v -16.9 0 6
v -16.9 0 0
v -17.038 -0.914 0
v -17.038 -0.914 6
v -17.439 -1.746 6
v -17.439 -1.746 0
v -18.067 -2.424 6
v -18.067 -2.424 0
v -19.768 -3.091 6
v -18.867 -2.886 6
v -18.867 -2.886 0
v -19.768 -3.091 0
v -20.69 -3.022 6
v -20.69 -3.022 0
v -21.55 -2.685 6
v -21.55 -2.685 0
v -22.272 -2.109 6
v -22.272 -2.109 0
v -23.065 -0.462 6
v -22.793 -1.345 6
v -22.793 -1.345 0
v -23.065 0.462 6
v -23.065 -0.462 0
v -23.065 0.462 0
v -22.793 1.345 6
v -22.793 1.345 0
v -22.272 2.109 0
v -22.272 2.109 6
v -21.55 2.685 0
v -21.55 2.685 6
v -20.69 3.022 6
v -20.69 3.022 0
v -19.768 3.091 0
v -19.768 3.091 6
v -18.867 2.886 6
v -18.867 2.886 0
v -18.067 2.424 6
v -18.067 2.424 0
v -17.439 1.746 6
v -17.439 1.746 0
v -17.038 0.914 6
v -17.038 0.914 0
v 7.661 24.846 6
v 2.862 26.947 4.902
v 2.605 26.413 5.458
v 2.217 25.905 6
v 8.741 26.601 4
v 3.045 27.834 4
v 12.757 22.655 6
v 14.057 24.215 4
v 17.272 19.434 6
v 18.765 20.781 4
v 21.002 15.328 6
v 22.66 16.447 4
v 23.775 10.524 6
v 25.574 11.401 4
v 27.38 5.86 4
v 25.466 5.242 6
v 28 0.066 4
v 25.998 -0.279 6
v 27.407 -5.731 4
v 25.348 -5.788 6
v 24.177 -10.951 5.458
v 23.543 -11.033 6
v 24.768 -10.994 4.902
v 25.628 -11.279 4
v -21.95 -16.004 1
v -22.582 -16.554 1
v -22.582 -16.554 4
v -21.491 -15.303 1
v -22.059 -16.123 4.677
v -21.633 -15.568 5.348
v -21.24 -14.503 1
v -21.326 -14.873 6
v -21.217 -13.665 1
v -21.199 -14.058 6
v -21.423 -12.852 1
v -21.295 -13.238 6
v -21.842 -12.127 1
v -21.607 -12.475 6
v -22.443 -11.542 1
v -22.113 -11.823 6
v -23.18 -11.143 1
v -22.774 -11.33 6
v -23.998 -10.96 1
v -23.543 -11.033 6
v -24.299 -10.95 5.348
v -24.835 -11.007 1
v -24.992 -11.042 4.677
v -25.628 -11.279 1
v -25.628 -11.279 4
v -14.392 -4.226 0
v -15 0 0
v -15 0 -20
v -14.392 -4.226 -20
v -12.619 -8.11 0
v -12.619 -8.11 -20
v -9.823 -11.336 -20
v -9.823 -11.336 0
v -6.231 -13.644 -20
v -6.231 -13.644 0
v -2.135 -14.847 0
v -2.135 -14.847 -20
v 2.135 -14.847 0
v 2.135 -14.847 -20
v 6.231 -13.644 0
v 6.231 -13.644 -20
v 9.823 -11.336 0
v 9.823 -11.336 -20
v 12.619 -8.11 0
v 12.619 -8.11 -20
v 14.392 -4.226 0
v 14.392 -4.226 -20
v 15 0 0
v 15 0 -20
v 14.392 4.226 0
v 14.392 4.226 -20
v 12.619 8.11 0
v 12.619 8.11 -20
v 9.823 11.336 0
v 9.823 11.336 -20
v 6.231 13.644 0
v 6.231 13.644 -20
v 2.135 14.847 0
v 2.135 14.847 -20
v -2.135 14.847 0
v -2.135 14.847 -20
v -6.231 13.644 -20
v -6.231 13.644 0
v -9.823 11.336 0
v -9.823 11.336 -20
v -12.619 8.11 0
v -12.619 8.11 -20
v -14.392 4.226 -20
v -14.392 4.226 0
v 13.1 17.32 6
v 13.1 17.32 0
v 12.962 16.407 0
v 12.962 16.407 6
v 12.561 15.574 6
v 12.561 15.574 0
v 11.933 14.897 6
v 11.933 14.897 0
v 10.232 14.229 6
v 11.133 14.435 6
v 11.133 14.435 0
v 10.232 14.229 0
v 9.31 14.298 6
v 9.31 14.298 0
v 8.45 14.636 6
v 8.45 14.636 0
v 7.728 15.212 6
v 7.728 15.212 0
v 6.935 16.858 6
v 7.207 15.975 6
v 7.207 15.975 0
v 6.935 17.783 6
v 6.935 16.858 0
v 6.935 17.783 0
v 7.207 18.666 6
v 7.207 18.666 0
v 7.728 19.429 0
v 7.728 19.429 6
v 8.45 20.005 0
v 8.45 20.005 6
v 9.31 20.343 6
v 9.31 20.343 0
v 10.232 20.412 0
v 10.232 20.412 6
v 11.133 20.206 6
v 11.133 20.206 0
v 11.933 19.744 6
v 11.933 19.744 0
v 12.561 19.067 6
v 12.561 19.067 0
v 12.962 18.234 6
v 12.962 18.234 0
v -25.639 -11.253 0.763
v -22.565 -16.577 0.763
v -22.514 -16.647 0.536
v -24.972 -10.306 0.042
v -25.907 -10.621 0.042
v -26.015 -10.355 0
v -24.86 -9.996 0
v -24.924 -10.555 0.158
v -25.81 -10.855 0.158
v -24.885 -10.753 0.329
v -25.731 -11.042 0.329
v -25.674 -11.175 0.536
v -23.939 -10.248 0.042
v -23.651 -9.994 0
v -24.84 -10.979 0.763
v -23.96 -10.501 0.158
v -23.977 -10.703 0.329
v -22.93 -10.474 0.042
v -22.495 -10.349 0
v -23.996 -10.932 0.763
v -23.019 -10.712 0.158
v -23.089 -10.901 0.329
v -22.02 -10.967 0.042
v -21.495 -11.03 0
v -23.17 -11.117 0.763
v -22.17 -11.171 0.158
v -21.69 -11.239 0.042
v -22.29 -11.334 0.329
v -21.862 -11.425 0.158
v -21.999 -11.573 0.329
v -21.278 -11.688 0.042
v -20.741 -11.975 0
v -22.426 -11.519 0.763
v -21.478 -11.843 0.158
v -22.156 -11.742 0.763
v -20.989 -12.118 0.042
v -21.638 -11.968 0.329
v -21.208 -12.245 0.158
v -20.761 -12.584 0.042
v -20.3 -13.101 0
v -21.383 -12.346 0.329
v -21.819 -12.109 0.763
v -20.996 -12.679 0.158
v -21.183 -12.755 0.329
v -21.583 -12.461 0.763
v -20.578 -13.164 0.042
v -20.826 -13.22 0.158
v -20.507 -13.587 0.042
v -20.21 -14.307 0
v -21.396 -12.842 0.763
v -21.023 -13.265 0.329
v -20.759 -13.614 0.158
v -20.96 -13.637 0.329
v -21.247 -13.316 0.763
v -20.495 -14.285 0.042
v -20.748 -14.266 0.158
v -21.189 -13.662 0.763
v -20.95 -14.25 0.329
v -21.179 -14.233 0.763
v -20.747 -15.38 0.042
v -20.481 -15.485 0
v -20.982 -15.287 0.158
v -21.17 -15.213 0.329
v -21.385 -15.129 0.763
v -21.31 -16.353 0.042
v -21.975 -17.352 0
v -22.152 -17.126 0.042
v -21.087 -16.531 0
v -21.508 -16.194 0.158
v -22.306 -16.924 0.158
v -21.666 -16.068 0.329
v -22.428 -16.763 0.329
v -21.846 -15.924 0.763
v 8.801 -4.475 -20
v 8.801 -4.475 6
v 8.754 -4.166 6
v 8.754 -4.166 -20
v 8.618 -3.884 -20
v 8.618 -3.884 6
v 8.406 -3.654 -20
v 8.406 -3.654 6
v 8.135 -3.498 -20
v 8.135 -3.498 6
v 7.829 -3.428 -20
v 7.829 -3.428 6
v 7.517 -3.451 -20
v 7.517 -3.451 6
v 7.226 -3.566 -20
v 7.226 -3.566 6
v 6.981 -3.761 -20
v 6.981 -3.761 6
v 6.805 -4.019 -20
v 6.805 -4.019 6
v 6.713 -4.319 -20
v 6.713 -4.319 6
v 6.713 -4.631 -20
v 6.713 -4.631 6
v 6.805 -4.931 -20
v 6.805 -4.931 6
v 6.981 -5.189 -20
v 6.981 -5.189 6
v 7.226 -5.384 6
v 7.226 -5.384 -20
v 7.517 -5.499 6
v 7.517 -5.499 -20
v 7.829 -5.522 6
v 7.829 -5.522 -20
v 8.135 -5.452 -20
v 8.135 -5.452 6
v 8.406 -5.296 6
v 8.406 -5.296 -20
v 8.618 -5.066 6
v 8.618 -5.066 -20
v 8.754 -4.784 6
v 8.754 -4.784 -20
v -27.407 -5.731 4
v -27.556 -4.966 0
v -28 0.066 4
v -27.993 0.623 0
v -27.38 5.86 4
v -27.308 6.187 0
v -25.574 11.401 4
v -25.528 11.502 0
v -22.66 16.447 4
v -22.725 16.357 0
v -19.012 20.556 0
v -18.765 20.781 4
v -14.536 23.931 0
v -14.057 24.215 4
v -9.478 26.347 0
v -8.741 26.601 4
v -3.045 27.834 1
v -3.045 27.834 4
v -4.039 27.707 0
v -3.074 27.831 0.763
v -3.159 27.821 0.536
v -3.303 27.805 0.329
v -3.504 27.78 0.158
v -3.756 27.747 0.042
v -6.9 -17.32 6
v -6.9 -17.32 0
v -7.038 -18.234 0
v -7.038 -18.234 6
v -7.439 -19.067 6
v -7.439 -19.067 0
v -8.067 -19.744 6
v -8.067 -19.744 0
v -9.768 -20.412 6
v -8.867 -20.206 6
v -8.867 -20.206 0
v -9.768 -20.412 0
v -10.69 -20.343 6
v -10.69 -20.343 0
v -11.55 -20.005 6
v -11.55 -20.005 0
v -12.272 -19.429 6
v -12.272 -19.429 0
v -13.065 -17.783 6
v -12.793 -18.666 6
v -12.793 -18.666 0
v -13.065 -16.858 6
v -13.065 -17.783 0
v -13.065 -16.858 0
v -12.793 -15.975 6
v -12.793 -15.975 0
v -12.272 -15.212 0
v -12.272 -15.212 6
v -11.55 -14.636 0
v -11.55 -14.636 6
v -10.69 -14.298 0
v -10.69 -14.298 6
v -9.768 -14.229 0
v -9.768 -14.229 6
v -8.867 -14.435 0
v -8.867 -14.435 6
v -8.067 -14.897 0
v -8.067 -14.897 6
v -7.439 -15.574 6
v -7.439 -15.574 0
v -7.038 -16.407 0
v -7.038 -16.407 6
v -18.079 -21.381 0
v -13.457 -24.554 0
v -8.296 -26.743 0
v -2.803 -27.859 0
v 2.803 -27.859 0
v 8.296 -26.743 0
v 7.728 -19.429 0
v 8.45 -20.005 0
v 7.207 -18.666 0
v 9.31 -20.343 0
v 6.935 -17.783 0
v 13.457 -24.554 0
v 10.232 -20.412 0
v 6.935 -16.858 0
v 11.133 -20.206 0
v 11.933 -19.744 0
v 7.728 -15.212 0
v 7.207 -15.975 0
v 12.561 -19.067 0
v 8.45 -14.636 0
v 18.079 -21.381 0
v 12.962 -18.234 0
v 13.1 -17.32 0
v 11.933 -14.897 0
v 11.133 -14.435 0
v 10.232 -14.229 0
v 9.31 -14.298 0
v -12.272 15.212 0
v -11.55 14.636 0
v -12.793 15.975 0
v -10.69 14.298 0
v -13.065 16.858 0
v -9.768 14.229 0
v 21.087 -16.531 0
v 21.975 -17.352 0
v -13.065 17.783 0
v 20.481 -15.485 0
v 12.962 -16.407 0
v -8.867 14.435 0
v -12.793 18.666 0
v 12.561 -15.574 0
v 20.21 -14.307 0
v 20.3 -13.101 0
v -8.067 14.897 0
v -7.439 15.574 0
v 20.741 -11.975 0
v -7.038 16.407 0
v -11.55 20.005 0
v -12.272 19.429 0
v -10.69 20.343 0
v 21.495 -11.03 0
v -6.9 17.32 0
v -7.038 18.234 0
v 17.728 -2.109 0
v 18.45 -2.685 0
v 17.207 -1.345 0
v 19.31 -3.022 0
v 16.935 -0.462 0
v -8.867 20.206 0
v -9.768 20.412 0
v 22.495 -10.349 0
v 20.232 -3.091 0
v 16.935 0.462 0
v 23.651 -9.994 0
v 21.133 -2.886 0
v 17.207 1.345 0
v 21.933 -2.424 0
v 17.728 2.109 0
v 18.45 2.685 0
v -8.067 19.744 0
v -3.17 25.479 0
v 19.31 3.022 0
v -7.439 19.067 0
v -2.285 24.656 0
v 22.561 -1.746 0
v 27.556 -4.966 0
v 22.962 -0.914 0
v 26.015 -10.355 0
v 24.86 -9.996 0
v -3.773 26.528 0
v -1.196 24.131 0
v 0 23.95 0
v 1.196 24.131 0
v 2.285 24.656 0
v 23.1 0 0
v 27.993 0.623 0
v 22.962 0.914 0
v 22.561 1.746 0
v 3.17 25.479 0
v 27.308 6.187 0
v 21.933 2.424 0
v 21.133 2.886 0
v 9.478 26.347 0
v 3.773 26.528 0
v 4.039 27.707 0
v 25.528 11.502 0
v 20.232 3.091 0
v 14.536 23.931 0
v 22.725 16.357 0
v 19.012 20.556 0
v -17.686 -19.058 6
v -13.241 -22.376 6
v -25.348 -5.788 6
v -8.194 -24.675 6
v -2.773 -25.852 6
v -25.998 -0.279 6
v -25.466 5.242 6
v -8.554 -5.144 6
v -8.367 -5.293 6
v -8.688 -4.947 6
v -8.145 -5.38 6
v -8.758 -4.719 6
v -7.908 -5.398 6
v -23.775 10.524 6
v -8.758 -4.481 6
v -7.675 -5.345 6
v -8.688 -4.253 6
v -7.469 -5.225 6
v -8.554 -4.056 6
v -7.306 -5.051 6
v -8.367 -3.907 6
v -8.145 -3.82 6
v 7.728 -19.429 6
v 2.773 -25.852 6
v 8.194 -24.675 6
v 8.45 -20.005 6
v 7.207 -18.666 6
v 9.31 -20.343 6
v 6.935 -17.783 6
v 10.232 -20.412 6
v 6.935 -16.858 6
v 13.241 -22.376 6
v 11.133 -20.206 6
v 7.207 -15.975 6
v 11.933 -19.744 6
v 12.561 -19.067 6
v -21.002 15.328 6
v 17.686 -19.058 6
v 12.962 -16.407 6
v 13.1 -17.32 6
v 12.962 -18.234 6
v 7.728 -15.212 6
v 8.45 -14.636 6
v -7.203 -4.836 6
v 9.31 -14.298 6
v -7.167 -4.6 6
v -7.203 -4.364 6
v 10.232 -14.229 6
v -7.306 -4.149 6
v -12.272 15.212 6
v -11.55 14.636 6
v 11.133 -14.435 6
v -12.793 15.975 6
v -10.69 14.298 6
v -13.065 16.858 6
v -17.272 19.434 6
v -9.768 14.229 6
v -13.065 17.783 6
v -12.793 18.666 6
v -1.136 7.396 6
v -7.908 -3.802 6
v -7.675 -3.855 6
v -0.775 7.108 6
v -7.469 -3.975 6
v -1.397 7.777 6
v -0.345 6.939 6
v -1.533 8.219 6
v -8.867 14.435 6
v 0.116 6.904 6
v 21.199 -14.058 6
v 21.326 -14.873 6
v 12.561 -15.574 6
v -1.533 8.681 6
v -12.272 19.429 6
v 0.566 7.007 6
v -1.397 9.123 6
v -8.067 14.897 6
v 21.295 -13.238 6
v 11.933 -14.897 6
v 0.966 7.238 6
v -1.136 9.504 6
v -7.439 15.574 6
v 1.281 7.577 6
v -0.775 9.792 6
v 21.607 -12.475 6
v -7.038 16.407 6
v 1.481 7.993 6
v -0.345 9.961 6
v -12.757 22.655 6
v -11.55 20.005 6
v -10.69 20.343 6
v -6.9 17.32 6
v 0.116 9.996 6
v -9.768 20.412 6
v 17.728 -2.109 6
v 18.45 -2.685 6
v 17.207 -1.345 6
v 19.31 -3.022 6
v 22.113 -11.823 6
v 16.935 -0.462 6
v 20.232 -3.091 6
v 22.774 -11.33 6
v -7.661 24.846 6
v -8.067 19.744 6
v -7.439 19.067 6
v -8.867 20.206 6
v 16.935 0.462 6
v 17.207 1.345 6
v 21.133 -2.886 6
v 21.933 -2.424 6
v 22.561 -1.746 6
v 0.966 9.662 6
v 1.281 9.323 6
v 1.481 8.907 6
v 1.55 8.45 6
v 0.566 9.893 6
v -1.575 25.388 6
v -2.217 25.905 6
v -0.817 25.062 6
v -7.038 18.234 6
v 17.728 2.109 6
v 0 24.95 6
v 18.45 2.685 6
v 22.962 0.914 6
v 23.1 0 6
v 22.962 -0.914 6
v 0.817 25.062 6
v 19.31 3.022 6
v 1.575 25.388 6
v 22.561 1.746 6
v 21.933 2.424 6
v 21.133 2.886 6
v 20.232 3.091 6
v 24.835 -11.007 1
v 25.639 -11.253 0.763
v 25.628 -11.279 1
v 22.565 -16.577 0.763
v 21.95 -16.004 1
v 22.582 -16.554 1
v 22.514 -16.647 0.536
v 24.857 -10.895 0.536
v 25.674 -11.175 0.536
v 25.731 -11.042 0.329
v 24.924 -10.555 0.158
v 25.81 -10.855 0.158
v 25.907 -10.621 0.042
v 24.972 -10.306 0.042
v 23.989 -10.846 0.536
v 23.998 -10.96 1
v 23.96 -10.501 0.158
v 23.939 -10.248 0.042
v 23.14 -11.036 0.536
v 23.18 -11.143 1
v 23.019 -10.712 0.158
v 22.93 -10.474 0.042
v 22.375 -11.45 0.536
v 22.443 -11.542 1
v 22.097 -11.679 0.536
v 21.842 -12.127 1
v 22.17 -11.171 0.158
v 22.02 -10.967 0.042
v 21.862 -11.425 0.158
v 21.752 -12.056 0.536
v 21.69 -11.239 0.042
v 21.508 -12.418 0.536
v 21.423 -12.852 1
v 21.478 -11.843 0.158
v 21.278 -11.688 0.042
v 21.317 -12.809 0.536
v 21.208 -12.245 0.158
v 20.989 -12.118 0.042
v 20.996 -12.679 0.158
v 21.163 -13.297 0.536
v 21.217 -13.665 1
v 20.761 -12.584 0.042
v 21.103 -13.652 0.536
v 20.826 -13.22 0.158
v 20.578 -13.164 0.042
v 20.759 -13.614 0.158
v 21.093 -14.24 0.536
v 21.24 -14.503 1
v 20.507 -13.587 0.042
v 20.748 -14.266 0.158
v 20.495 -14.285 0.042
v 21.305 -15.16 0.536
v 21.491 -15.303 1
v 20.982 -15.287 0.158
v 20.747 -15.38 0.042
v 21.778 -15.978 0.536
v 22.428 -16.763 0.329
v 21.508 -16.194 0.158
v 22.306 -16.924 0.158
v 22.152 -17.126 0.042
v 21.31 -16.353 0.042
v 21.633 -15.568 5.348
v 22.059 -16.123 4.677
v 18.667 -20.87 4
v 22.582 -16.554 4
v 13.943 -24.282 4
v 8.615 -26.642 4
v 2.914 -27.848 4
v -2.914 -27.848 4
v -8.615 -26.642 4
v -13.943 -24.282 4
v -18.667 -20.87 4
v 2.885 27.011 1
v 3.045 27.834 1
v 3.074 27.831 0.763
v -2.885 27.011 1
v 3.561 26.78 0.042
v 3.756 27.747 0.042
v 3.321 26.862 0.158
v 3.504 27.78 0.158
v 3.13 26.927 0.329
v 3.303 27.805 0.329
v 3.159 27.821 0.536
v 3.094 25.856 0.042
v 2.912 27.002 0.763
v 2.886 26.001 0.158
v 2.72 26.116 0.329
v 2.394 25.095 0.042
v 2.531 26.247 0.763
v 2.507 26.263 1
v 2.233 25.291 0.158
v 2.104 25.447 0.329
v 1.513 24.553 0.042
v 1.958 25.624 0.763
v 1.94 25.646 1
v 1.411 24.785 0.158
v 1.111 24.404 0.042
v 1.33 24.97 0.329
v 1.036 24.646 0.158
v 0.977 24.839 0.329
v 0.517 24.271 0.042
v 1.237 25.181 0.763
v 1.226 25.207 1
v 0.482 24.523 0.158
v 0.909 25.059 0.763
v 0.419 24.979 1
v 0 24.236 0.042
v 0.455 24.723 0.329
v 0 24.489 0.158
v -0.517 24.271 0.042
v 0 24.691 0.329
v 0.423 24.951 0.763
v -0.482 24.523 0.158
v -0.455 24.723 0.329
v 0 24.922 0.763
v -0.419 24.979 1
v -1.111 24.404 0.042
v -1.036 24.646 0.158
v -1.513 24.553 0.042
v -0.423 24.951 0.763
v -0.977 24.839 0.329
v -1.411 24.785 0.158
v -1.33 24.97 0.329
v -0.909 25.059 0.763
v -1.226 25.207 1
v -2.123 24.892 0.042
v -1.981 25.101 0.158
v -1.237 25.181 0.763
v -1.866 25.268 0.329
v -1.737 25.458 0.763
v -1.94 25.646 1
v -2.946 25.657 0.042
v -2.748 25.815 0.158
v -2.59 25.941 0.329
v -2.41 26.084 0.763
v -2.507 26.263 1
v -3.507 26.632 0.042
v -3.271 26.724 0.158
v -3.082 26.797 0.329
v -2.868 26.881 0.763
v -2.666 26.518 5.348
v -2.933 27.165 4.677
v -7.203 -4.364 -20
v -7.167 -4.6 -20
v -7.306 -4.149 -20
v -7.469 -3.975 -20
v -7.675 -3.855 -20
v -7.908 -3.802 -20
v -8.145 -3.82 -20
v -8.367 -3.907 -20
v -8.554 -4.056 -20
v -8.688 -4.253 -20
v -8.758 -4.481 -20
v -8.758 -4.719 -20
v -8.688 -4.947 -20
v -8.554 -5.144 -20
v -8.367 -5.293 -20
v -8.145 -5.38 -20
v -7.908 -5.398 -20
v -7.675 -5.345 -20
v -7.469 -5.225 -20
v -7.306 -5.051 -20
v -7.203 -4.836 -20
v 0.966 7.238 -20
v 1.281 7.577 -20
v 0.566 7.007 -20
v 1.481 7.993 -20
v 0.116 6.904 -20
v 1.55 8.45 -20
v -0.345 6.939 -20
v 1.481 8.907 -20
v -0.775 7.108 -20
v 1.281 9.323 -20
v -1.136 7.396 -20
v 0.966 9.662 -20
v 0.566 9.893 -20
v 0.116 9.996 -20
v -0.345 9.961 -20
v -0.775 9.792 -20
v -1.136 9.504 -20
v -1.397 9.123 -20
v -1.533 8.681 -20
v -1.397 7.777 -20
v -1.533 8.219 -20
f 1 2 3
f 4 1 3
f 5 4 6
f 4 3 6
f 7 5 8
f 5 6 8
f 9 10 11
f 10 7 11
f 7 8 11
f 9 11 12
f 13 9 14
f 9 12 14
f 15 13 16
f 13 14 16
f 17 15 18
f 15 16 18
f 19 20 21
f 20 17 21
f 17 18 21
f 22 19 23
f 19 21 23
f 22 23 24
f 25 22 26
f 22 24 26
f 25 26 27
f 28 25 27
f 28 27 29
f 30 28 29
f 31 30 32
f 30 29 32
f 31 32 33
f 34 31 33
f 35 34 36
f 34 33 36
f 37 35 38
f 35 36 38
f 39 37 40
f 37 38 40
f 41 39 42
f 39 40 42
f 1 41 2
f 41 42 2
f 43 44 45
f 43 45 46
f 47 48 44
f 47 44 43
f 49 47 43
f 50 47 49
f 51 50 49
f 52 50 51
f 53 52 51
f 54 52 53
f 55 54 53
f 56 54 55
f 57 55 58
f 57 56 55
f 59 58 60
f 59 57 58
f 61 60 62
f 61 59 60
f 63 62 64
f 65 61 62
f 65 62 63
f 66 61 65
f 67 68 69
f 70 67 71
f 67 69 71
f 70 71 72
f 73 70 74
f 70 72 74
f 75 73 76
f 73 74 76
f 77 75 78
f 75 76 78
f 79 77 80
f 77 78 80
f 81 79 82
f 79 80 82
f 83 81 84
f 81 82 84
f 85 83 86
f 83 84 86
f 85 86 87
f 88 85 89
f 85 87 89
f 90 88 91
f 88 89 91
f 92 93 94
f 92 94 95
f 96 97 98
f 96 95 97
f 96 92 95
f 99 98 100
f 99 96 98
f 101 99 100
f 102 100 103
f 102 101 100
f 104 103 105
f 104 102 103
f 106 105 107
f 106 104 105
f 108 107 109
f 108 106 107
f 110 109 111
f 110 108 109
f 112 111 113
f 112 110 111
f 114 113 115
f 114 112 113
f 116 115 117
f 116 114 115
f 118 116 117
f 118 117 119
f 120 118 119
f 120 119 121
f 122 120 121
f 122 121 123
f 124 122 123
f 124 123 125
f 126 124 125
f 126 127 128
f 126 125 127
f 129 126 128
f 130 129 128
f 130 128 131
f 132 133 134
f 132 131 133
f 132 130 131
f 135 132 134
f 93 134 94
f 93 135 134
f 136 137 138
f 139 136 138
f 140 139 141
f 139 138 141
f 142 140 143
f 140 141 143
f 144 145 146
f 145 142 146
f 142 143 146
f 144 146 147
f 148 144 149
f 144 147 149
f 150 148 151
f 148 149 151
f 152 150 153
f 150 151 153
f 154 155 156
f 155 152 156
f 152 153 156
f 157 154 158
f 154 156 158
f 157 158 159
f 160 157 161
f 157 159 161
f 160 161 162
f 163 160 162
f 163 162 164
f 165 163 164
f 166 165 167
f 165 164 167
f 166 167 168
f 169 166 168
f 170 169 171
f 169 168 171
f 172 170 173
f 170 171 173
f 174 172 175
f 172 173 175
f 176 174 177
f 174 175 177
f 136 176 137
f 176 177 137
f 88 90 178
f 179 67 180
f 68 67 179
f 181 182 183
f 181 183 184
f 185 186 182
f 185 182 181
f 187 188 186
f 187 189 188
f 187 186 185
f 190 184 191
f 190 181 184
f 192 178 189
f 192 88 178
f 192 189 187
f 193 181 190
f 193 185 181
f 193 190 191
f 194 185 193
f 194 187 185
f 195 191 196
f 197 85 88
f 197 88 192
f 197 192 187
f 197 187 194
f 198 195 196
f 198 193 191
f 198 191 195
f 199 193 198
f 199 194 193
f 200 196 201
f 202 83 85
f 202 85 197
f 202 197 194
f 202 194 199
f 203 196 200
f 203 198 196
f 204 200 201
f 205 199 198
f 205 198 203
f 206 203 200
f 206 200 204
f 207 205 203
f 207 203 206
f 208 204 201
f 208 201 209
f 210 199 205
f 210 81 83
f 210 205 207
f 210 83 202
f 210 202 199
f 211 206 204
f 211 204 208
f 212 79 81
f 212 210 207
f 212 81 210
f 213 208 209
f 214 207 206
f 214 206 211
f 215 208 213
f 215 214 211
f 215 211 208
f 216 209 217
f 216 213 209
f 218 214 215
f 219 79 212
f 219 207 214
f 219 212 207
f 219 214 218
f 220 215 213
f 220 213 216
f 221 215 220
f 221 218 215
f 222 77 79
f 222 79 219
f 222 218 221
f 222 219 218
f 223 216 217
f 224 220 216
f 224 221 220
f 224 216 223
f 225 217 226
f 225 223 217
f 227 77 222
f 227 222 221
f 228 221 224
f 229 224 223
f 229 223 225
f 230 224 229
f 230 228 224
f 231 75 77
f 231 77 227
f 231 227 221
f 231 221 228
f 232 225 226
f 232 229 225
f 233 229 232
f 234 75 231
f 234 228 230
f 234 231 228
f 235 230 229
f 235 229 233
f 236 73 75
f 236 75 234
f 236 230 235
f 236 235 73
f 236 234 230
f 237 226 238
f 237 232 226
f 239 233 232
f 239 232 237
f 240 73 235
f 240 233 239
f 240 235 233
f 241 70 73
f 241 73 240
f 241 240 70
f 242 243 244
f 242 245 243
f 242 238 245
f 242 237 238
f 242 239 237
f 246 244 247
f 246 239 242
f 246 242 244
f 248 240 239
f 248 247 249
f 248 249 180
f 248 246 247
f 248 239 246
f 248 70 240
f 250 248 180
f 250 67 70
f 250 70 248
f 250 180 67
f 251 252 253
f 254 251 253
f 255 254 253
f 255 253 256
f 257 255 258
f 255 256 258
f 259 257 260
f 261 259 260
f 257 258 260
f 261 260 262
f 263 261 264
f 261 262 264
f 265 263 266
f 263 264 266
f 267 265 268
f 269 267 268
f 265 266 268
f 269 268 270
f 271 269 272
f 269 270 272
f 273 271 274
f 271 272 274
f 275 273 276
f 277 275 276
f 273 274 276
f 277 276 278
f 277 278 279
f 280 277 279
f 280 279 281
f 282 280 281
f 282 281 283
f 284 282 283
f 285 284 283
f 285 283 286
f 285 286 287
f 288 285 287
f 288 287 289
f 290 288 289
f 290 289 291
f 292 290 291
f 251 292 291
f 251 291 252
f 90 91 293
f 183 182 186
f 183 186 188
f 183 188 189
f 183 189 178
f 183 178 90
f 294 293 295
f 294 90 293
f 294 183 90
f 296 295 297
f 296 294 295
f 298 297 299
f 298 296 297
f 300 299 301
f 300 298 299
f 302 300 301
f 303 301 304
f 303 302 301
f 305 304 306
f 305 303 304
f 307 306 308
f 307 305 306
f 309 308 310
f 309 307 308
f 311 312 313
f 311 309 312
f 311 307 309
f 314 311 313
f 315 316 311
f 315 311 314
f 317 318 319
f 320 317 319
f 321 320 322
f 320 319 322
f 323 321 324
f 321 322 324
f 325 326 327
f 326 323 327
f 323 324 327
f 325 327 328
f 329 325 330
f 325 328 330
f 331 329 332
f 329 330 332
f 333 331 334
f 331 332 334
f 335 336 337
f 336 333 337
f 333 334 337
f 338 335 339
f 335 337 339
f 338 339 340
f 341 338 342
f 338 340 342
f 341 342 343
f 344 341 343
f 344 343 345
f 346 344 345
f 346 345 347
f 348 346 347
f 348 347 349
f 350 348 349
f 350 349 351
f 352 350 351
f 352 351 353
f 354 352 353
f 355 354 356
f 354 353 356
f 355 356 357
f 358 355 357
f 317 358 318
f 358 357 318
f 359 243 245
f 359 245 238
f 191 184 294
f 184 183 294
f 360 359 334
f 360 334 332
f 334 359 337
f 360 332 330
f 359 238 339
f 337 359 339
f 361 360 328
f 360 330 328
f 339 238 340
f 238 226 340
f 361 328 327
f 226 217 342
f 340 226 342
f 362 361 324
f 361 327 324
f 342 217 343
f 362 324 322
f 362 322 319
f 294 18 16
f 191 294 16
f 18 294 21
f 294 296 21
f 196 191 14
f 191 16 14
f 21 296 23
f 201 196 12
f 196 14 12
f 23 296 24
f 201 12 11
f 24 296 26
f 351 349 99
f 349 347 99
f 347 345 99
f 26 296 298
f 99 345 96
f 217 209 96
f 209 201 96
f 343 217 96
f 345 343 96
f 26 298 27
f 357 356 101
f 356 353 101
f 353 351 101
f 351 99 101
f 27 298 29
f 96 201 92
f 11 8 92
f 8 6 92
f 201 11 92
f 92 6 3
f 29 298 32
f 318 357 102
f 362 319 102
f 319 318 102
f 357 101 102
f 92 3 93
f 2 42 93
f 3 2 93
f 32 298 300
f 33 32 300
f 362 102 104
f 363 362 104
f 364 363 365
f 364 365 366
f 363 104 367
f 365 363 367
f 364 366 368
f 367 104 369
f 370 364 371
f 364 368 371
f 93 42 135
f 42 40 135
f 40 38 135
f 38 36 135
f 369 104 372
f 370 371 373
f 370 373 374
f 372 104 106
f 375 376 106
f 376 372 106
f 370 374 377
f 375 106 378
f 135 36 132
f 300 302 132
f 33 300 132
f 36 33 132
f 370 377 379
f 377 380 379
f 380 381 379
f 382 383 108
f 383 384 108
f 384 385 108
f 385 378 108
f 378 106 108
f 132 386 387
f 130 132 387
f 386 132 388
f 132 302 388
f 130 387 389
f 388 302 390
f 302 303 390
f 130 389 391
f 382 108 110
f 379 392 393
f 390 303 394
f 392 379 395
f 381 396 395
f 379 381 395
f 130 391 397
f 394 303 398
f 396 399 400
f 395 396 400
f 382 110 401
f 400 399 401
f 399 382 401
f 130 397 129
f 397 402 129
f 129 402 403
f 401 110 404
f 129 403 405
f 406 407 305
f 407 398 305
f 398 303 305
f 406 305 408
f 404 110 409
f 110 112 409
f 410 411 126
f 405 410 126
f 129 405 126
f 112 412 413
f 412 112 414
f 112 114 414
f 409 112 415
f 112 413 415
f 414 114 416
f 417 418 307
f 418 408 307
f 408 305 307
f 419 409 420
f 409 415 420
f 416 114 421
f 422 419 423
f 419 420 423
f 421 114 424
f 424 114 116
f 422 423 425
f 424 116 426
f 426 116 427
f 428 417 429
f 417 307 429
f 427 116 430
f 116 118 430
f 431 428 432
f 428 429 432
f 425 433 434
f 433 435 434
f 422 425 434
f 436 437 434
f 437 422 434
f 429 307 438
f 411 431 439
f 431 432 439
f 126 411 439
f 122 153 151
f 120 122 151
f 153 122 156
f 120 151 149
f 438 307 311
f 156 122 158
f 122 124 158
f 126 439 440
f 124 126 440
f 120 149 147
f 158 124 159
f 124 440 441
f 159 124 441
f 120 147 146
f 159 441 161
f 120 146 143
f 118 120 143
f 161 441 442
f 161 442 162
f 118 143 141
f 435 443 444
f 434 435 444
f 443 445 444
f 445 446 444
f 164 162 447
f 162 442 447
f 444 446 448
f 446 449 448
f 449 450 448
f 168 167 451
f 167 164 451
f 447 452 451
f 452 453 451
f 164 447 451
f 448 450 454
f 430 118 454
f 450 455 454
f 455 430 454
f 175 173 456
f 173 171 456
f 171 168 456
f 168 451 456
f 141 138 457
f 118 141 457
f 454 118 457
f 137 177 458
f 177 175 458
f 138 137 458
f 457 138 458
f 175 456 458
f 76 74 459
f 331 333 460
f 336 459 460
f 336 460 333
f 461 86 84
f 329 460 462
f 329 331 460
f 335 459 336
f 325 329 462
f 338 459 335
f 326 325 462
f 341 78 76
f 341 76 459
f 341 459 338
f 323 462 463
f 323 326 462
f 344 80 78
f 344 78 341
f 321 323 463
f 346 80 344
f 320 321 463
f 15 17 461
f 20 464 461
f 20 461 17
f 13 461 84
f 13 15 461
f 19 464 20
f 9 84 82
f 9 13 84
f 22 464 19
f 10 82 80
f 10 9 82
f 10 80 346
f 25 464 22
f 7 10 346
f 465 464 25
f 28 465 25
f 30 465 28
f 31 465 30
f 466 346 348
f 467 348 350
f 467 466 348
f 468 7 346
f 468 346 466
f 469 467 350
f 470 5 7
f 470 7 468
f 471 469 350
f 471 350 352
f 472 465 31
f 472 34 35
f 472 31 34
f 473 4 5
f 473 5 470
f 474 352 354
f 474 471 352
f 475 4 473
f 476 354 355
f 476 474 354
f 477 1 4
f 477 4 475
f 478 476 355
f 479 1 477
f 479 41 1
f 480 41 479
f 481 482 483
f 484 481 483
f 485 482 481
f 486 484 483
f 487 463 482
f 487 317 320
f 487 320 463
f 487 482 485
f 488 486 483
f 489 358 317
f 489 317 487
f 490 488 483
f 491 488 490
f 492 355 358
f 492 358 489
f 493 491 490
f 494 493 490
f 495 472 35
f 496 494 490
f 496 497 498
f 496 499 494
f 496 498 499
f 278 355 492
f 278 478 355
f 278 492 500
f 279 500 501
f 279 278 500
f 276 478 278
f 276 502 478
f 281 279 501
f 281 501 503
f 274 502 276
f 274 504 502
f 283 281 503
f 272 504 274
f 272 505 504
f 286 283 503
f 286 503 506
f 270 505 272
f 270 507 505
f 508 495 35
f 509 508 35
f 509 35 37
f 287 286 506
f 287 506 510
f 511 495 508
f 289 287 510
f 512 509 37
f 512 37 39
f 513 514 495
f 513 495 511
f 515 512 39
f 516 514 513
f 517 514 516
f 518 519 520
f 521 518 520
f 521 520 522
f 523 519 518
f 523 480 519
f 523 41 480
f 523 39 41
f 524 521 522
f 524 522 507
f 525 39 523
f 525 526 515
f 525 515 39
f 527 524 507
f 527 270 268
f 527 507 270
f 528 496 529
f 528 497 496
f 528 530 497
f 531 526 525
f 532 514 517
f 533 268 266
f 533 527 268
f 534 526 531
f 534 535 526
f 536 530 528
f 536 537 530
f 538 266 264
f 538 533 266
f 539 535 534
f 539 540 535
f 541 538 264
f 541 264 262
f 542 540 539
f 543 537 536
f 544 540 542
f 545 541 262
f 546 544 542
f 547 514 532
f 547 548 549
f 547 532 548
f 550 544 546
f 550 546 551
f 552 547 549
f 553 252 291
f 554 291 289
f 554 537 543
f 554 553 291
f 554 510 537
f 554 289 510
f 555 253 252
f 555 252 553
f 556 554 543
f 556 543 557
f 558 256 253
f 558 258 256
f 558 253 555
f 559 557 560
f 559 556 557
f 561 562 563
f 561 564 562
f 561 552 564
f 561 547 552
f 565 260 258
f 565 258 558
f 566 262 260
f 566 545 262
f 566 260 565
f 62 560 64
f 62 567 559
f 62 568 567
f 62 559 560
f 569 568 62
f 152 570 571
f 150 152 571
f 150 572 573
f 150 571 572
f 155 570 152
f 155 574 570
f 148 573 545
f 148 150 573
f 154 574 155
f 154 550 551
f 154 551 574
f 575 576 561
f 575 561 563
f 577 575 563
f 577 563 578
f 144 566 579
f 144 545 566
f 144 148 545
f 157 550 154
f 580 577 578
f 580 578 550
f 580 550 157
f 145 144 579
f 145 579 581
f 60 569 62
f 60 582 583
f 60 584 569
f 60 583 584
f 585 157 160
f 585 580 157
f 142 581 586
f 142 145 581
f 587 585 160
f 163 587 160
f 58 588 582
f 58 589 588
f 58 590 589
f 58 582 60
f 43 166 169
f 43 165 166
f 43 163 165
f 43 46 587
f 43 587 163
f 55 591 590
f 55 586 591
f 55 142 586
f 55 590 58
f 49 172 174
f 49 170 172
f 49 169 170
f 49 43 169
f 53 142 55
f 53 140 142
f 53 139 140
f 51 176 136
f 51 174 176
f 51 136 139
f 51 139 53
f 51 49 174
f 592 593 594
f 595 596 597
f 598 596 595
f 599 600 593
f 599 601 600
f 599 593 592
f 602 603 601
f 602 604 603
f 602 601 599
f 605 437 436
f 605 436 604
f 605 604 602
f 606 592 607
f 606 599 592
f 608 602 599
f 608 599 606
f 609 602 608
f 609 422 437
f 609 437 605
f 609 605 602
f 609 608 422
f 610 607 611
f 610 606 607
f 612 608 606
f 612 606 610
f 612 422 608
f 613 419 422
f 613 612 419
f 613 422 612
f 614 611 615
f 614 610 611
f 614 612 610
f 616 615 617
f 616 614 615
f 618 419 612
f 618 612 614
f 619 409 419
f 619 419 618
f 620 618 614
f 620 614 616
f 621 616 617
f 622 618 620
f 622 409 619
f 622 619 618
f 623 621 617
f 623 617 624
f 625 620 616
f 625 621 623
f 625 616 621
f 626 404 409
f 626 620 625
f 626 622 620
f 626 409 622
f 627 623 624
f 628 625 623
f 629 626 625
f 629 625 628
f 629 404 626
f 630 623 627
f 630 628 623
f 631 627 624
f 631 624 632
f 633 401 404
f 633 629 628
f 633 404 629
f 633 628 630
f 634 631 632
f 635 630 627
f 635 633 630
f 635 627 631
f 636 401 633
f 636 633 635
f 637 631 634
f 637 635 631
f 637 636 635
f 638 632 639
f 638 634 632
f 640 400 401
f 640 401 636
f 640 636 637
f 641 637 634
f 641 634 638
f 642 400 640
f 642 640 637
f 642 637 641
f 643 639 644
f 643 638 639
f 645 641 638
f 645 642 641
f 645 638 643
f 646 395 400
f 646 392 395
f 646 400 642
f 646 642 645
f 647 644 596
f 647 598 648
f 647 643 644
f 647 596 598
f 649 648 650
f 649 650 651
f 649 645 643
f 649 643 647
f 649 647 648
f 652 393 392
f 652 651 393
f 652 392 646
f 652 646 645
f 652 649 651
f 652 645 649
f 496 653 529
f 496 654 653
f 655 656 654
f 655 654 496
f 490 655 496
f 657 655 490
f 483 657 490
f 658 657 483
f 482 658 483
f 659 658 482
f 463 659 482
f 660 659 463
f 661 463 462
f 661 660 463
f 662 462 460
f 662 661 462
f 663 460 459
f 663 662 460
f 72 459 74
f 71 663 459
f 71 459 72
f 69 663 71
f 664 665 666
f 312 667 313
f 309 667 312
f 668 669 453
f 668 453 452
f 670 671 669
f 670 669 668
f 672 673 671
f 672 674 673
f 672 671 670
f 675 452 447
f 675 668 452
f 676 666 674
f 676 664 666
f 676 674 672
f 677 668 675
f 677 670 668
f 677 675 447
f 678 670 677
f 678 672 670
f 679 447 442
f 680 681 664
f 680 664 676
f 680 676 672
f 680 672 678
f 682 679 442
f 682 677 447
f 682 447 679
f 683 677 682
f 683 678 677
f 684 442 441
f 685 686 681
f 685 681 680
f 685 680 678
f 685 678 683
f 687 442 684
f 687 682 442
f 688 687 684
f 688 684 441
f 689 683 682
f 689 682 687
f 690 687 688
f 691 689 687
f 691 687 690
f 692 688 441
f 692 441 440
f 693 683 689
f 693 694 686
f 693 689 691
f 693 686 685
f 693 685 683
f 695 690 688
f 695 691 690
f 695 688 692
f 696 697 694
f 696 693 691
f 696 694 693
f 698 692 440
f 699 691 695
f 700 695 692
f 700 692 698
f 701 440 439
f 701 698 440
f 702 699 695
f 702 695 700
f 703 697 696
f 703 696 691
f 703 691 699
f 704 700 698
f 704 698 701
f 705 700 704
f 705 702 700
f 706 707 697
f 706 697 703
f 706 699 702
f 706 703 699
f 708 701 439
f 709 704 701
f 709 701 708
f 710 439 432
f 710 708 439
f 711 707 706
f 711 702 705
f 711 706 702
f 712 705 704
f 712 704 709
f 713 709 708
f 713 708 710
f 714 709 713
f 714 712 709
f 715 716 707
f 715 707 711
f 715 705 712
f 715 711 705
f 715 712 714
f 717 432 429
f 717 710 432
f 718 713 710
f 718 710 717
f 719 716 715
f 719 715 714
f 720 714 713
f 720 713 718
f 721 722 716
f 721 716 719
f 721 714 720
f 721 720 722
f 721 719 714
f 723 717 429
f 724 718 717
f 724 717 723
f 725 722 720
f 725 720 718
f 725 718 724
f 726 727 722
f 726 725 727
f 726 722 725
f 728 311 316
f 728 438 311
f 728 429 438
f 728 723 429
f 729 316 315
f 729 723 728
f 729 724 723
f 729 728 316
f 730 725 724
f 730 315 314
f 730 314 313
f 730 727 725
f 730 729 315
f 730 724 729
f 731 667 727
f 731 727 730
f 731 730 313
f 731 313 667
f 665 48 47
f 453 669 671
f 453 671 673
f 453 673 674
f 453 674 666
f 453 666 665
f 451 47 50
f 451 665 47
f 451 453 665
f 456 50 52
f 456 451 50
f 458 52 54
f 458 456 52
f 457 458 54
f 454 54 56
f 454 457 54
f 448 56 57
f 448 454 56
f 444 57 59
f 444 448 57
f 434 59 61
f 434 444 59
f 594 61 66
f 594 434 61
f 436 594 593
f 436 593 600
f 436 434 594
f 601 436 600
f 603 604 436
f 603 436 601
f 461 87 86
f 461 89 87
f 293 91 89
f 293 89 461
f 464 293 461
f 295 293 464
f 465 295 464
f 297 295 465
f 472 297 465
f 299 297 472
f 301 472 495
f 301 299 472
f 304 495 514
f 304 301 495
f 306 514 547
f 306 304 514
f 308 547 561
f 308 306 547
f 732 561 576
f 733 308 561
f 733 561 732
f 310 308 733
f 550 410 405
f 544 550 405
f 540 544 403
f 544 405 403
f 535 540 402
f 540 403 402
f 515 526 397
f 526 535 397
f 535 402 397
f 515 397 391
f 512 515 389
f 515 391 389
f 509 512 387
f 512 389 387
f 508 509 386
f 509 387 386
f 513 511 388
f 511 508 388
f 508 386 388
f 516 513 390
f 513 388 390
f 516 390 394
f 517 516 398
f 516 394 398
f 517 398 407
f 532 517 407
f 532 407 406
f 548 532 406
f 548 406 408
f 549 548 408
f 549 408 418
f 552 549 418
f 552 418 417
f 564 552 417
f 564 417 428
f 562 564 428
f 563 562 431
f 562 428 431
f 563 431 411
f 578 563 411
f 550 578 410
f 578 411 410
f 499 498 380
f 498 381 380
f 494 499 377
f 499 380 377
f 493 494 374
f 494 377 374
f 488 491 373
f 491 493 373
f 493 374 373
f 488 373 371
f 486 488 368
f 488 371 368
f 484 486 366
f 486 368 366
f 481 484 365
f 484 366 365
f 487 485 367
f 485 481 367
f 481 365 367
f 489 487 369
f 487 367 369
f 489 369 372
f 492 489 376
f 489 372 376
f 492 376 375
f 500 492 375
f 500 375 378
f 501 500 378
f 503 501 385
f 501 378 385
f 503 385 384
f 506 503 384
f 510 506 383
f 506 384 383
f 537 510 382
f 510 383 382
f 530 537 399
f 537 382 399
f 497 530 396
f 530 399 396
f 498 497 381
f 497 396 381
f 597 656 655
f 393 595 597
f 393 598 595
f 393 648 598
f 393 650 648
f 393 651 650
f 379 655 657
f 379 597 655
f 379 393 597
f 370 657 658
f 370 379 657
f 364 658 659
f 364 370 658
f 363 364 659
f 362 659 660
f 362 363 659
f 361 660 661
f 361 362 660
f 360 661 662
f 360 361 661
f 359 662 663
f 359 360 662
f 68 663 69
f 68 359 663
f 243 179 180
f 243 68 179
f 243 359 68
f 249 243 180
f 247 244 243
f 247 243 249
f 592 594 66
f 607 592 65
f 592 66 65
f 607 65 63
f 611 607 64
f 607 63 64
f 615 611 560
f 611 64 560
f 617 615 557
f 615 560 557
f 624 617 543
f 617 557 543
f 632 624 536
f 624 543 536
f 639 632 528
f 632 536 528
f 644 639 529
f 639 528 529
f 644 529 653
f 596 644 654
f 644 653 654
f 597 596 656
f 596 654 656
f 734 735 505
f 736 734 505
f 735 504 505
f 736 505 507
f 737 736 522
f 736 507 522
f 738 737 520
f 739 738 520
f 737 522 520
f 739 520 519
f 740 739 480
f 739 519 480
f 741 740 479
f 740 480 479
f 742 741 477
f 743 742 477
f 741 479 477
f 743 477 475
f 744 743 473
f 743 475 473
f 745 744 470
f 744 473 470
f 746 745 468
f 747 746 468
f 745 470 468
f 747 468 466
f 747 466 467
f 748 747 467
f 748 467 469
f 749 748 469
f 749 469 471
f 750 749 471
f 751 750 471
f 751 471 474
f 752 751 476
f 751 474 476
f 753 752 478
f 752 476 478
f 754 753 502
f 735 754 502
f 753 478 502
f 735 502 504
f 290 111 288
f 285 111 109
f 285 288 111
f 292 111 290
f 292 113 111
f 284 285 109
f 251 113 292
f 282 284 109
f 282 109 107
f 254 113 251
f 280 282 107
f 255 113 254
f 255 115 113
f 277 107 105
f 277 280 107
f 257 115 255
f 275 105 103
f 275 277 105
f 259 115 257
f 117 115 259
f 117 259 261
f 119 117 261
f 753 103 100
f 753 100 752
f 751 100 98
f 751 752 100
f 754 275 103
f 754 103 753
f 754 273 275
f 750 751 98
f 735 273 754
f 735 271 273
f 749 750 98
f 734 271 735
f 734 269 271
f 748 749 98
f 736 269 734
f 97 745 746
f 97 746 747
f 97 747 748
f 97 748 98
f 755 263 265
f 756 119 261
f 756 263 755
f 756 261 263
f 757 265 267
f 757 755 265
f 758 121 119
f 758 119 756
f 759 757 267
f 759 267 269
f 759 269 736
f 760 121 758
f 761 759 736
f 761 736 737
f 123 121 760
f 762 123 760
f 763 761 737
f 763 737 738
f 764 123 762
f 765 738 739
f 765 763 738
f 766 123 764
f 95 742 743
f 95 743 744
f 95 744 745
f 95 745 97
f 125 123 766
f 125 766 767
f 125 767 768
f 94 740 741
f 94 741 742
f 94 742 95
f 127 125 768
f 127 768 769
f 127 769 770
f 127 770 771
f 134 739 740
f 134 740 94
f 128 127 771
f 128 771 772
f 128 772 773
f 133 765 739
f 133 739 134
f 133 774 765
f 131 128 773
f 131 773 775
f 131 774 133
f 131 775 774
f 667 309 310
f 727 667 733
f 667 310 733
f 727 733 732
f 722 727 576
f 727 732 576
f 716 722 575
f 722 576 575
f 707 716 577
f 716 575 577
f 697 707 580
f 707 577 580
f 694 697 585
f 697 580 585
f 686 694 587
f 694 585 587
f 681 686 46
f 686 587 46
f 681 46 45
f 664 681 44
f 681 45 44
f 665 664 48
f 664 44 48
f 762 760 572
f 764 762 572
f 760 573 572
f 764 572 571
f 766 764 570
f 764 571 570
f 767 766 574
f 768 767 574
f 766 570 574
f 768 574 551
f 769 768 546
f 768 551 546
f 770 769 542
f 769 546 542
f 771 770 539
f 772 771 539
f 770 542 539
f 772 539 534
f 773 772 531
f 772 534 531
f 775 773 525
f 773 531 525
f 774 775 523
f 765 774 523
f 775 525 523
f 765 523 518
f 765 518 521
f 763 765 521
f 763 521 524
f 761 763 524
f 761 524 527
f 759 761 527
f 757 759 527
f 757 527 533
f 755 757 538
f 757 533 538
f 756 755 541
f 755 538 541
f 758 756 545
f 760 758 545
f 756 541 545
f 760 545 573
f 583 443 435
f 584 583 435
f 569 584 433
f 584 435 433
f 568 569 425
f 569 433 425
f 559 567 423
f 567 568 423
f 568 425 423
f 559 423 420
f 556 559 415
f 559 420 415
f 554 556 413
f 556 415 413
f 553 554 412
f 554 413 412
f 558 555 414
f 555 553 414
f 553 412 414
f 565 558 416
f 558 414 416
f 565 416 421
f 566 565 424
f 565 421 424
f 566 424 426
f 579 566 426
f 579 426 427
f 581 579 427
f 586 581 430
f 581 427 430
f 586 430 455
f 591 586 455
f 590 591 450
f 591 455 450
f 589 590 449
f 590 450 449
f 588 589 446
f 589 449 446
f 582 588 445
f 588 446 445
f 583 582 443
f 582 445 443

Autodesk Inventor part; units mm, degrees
ref_plane "YZ Plane" through (0, 0, 0) normal (1, 0, 0) x (0, 1, 0)
ref_plane "XZ Plane" through (0, 0, 0) normal (0, 1, 0) x (-1, 0, 0)
ref_plane "XY Plane" through (0, 0, 0) normal (0, 0, 1) x (1, 0, 0)
sketch "Sketch1" plane through (0, 0, 0) normal (0, 0, 1) x (1, 0, 0)
  circle A0 centre (0, 0) radius 28
  circle A1 centre (-20, 0) radius 3.1
  circle A2 centre (-10, -17.3205) radius 3.1
  circle A3 centre (10, -17.3205) radius 3.1
  circle A4 centre (20, 0) radius 3.1
  circle A5 centre (10, 17.3205) radius 3.1
  circle A6 centre (-10, 17.3205) radius 3.1
  dimension "d0" = 56
  dimension "d1" = 6.2
  dimension "d2" = 20
  dimension "d3" = 0
  dimension "d6" = 360
extrude "Extrusion1" add sketch "Sketch1" along normal blind 6
sketch "Sketch2" plane through (0, 0, 0) normal (0, 0, -1) x (-1, 0, 0)
  circle A0 centre (0, 0) radius 15
  dimension "d10" = 30
extrude "Extrusion2" add sketch "Sketch2" along normal blind 20
sketch "Sketch3" plane through (0, 0, 6) normal (0, 0, 1) x (1, 0, 0)
  circle A0 centre (0, 0) radius 28 projected
  circle A1 centre (0, 28) radius 3.05
  circle A2 centre (-24.2487, -14) radius 3.05
  circle A3 centre (24.2487, -14) radius 3.05
  circle A4 centre (0, 8.45) radius 1.55
  line L0 (0, 28) -> (0, 0) construction
  line L1 (0, 0) -> (24.2487, -14) construction
  line L2 (-24.2487, -14) -> (0, 0) construction
  circle A5 centre (7.7509, -4.475) radius 1.05
  circle A6 centre (-7.9674, -4.6) radius 0.8
  circle A7 centre (0, 0) radius 10 construction
  point P0 (25.6276, -11.2795)
  point P1 (22.5821, -16.5544)
  point P2 (-25.6276, -11.2795)
  point P3 (-22.5821, -16.5544)
  point P4 (-3.0455, 27.8339)
  point P5 (3.0455, 27.8339)
  dimension "d13" = 6.1
  dimension "d17" = 360
  dimension "d19" = 3.1
  dimension "d20" = 0
  dimension "d21" = 0
  dimension "d22" = 2.1
  dimension "d23" = 1.6
  dimension "d24" = 20
extrude "Extrusion3" cut sketch "Sketch3" against normal through all contours A1 A0 | A0 A3 | A2 A0 | A4 | A5 | A6 picked at (0.1183, 26.9779) picked at (23.3044, -13.5914) picked at (-23.3241, -13.5486)
chamfer "Chamfer1" distance 2 angle 45 3 edges at (-24.2487, 14, 6) (0, -28, 6) (24.2487, 14, 6)
fillet "Fillet1" radius 1 3 edges at (21.6073, -12.475, 0) (-21.6073, -12.475, 0) (0, 24.95, 0)
properties part number "Schneidtrommel"
